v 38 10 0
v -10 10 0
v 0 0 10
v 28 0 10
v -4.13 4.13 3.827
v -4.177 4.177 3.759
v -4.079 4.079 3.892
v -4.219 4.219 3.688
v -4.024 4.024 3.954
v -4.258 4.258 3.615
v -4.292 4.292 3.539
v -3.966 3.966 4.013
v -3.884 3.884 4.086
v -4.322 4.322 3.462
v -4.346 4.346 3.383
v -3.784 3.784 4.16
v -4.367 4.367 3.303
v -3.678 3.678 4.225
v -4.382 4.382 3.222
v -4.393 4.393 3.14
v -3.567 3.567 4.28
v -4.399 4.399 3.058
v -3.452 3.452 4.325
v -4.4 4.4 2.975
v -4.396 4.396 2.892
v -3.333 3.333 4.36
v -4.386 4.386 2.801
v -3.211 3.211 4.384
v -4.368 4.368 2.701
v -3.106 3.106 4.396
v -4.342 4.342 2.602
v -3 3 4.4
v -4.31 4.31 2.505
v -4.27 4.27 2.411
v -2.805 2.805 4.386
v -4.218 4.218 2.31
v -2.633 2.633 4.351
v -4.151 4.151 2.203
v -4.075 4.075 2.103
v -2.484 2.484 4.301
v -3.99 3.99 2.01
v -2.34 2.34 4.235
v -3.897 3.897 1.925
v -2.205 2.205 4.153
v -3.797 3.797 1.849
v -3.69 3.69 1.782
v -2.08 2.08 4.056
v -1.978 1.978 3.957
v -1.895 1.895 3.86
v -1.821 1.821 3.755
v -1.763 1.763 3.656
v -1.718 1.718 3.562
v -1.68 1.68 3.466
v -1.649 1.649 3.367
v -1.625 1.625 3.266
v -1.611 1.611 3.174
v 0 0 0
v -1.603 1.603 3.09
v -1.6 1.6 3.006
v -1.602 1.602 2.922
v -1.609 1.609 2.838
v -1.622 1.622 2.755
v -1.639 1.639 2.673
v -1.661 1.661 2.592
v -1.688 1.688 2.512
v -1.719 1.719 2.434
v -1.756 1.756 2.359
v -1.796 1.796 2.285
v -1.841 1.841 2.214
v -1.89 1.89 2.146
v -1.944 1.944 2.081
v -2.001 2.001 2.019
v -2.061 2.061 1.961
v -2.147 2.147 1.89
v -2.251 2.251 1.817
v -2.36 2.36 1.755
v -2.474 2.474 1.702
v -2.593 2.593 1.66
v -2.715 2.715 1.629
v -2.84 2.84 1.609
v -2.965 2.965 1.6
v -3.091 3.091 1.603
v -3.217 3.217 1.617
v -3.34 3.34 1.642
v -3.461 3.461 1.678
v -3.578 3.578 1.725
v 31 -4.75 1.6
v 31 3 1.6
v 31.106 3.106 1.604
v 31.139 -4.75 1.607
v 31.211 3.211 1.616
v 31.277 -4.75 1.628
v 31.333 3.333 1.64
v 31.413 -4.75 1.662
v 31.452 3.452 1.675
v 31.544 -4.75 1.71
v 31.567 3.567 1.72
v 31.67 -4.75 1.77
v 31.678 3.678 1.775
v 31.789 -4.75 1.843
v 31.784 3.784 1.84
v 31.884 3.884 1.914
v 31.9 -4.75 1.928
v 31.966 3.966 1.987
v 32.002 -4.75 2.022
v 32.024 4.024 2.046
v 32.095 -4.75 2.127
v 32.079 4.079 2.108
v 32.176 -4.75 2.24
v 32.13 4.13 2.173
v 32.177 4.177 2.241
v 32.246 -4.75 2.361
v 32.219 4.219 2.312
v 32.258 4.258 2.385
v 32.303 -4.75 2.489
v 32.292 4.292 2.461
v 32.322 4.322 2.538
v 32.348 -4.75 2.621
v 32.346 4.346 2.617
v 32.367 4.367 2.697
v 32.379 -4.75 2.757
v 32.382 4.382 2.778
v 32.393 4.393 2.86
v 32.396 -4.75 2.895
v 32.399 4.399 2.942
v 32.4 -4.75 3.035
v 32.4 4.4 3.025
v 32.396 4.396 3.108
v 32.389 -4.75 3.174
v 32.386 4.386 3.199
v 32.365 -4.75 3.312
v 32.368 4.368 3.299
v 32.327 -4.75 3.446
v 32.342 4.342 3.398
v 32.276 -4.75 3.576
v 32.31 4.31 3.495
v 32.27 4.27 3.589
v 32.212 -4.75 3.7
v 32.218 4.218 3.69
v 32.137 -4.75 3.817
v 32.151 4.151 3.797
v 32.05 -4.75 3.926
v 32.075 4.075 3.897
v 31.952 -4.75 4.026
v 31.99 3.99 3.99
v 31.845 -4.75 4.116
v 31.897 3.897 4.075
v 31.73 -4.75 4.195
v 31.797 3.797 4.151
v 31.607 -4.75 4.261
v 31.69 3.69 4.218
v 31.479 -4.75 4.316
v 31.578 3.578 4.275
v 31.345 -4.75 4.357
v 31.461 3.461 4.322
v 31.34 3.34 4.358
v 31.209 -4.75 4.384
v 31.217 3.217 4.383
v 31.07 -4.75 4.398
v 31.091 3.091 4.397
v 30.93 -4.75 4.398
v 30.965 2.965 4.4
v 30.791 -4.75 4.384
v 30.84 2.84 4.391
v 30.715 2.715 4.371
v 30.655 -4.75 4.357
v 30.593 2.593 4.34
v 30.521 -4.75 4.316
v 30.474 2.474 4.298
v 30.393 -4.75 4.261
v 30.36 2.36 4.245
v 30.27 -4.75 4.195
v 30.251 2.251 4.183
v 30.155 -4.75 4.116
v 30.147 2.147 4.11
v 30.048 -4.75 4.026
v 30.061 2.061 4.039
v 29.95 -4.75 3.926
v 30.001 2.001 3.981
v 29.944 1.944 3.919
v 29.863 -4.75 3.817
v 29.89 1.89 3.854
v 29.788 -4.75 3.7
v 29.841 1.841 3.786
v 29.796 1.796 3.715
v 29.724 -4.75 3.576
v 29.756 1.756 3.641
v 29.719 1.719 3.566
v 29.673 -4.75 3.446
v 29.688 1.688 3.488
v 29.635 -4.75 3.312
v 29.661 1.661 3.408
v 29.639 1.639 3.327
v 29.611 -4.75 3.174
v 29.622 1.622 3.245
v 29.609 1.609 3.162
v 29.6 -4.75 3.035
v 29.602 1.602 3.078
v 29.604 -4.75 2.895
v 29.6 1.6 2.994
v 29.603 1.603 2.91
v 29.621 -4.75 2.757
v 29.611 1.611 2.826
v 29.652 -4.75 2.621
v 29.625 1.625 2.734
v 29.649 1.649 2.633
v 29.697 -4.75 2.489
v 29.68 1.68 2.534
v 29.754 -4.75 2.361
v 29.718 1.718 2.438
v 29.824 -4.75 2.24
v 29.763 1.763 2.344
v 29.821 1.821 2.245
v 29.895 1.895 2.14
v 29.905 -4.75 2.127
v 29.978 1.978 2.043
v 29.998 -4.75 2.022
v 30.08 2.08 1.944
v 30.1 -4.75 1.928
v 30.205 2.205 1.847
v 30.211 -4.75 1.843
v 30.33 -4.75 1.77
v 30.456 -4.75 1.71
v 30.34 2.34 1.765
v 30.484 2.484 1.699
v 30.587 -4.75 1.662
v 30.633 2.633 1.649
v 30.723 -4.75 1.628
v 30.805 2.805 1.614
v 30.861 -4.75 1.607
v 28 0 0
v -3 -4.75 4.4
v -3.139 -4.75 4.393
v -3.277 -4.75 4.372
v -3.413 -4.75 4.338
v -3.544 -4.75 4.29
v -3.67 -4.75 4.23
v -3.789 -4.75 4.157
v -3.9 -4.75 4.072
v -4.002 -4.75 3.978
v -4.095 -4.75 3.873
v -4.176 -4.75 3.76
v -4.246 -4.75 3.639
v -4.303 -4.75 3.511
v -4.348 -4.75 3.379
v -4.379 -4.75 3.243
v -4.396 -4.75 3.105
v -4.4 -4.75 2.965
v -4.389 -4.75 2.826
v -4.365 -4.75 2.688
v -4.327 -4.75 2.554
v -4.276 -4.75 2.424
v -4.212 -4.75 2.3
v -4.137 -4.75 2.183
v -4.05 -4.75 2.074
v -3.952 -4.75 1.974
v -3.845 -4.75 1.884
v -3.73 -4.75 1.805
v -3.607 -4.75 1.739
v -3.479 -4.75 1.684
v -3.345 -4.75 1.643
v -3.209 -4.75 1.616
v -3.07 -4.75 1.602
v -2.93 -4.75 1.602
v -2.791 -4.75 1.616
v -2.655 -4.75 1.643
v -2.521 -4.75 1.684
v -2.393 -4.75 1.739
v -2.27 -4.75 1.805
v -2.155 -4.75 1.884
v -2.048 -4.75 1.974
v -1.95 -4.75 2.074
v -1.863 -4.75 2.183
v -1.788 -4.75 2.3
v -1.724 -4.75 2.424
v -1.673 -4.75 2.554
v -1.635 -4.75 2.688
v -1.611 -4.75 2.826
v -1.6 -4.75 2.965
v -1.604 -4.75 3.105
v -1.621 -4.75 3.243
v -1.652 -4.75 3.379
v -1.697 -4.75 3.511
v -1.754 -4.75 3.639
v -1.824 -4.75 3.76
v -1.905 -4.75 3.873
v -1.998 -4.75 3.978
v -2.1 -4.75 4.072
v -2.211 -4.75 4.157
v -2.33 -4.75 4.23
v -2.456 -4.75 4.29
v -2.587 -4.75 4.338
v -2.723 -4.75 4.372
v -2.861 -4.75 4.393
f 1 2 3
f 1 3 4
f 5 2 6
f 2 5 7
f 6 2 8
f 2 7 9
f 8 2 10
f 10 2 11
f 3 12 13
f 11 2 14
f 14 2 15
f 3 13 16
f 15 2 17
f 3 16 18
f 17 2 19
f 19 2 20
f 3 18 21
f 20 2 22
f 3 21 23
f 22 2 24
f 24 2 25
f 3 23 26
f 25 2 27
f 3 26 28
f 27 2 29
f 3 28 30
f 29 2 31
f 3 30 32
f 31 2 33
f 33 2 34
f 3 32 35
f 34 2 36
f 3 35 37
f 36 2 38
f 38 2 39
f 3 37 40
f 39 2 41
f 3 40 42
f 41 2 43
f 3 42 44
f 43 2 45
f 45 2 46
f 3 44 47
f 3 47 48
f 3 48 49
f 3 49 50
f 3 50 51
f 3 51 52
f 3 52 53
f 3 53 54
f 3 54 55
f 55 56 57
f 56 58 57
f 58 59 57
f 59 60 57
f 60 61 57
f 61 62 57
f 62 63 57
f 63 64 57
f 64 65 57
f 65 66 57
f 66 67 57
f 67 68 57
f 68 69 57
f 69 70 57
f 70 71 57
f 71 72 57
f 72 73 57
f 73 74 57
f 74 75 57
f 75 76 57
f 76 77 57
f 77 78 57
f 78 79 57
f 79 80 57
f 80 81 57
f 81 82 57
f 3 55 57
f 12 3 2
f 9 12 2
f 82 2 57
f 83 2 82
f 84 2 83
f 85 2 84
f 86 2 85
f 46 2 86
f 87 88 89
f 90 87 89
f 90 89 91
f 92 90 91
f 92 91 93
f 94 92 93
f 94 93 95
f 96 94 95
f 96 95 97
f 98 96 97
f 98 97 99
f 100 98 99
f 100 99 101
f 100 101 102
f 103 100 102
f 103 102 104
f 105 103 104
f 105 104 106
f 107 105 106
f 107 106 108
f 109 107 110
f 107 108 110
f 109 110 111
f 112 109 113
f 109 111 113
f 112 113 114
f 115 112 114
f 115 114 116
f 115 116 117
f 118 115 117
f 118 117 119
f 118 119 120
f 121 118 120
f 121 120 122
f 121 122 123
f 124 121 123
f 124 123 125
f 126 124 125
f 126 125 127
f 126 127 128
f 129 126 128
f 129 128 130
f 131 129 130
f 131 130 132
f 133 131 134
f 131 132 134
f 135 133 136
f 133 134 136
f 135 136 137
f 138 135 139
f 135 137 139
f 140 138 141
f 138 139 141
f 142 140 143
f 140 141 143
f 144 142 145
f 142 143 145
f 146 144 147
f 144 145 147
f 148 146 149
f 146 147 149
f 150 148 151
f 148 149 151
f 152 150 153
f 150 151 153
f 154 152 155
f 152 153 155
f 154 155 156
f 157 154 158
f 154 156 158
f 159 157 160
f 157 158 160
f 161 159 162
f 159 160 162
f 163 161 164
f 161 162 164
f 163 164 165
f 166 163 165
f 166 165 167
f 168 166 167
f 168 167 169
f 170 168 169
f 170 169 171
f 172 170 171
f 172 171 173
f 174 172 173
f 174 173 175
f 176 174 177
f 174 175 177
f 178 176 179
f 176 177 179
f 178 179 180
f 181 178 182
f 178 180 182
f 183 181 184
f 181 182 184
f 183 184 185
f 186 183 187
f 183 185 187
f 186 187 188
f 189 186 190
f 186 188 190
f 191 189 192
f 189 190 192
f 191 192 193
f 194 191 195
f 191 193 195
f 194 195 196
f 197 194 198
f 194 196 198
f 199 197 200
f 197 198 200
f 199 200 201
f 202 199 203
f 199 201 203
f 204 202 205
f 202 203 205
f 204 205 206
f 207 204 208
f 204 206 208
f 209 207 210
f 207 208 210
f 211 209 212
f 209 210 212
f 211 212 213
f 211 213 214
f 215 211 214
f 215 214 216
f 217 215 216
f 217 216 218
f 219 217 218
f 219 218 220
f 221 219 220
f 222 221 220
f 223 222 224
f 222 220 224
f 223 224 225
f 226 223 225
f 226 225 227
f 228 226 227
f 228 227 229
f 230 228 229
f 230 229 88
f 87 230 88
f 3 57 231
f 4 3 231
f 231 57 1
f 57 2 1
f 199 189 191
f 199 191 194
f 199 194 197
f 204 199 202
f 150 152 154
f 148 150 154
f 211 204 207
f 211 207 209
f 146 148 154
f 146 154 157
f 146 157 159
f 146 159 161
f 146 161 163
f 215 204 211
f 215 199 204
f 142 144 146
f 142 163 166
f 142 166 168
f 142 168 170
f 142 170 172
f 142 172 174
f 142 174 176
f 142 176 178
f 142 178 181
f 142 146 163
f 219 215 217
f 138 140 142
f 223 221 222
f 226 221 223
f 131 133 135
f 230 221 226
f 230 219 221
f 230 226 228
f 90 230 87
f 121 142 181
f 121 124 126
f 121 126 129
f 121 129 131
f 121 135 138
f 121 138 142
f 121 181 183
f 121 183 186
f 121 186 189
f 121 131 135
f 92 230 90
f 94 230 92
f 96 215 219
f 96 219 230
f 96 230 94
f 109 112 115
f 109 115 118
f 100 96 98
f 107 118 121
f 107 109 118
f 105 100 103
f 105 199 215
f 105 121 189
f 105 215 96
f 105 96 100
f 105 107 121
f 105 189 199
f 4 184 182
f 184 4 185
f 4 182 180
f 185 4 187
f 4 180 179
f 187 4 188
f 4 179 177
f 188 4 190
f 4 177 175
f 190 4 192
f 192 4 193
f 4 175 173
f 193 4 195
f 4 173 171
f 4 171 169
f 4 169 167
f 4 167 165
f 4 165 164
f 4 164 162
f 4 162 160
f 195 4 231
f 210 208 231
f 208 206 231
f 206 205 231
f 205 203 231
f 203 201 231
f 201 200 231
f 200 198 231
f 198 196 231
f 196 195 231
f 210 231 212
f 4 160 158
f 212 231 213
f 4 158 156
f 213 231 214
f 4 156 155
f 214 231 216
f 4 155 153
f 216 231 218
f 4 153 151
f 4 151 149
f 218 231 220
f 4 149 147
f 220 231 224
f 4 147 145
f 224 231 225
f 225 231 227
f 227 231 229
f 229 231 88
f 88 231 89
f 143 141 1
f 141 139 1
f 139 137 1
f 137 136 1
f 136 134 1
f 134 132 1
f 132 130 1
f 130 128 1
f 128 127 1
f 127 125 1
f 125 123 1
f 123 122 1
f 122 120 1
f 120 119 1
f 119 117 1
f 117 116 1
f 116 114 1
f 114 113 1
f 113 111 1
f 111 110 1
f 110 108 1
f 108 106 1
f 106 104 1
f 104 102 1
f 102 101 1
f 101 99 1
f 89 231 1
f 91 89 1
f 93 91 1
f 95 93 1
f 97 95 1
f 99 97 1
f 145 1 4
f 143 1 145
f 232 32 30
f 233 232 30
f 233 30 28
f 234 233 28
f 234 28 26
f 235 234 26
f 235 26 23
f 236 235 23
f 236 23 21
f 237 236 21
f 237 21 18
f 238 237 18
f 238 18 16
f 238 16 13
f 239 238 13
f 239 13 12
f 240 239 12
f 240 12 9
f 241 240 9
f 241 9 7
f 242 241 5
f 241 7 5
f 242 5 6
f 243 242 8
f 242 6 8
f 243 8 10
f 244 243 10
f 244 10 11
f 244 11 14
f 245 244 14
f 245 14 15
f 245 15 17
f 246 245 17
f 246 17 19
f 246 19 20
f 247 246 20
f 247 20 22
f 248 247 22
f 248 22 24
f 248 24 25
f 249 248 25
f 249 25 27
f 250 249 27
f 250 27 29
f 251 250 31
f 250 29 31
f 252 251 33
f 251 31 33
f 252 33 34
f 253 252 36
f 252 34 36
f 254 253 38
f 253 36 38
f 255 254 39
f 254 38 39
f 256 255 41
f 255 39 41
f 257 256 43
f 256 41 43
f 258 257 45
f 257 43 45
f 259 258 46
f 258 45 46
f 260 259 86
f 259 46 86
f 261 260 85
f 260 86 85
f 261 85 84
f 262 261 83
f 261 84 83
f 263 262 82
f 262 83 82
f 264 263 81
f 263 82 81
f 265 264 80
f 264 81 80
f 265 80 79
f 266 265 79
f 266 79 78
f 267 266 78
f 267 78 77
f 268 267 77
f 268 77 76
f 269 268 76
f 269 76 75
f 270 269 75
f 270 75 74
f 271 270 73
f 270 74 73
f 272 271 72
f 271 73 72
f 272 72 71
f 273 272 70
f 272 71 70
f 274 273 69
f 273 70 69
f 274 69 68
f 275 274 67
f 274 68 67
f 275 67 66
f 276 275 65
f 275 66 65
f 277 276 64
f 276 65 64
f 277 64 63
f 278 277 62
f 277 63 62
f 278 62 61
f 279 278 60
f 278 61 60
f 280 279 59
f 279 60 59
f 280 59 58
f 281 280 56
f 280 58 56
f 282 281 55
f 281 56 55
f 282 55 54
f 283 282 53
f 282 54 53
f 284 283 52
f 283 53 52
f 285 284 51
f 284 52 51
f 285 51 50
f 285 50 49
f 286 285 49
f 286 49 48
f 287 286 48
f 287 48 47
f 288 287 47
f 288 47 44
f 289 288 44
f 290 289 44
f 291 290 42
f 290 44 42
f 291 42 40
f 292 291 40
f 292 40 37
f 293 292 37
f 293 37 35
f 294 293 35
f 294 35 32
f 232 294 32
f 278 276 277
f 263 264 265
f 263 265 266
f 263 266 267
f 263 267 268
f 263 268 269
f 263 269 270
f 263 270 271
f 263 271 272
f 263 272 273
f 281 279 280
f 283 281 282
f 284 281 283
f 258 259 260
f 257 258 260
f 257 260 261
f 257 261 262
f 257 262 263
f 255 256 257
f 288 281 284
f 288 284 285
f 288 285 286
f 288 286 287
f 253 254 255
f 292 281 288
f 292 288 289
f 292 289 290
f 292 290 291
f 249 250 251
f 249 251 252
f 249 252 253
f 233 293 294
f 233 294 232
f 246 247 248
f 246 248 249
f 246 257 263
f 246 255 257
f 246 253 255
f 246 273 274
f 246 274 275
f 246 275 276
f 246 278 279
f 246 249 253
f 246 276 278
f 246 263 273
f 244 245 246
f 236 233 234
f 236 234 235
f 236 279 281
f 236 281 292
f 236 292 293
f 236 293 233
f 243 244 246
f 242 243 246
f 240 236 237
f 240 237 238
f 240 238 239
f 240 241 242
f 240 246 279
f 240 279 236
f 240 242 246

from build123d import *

# Parameters (mm, degrees)
BOSS_EXTRUDE1_DEPTH = 10
CHAMFER1_SIZE       = 10
BOSS_EXTRUDE2_START = -10
SKETCH2_R           = 1.4
BOSS_EXTRUDE2_DEPTH = 14.75
CUT_EXTRUDE1_DEPTH  = 5


with BuildPart() as part:
    # Sketch1 → Boss-Extrude1 (new body)
    with BuildSketch(Plane.XY):
        Polygon((0, 0), (28, 0), (38, 10), (-10, 10), align=None)
    extrude(amount=BOSS_EXTRUDE1_DEPTH)

    # Chamfer1
    chamfer1_edges = [part.edges().sort_by_distance(p)[0] for p in [
        (14, 10, 10),
    ]]
    chamfer(chamfer1_edges, length=CHAMFER1_SIZE - 0.0001)  # a hair under: the kernel refuses the full size

    # Sketch2 → Boss-Extrude2 (add)
    with BuildSketch(Plane.XZ.offset(BOSS_EXTRUDE2_START)):
        with Locations(Location((31, 3, 0), (0, 0, 270))):
            Circle(SKETCH2_R)
        with Locations(Location((-3, 3, 0), (0, 0, 90))):
            Circle(SKETCH2_R)
    extrude(amount=BOSS_EXTRUDE2_DEPTH)

    # Sketch4 → Cut-Extrude1 (cut)
    with BuildSketch(Plane(origin=(0, 5, 5), x_dir=(1, 0, 0), z_dir=(0, 0.7071067811865487, 0.7071067811865465))):
        Polygon((-10, 7.071067812), (0, -7.071067812), (28, -7.071067812), (38, 7.071067812), align=None)
    extrude(amount=CUT_EXTRUDE1_DEPTH, mode=Mode.SUBTRACT)


solid = part.part
